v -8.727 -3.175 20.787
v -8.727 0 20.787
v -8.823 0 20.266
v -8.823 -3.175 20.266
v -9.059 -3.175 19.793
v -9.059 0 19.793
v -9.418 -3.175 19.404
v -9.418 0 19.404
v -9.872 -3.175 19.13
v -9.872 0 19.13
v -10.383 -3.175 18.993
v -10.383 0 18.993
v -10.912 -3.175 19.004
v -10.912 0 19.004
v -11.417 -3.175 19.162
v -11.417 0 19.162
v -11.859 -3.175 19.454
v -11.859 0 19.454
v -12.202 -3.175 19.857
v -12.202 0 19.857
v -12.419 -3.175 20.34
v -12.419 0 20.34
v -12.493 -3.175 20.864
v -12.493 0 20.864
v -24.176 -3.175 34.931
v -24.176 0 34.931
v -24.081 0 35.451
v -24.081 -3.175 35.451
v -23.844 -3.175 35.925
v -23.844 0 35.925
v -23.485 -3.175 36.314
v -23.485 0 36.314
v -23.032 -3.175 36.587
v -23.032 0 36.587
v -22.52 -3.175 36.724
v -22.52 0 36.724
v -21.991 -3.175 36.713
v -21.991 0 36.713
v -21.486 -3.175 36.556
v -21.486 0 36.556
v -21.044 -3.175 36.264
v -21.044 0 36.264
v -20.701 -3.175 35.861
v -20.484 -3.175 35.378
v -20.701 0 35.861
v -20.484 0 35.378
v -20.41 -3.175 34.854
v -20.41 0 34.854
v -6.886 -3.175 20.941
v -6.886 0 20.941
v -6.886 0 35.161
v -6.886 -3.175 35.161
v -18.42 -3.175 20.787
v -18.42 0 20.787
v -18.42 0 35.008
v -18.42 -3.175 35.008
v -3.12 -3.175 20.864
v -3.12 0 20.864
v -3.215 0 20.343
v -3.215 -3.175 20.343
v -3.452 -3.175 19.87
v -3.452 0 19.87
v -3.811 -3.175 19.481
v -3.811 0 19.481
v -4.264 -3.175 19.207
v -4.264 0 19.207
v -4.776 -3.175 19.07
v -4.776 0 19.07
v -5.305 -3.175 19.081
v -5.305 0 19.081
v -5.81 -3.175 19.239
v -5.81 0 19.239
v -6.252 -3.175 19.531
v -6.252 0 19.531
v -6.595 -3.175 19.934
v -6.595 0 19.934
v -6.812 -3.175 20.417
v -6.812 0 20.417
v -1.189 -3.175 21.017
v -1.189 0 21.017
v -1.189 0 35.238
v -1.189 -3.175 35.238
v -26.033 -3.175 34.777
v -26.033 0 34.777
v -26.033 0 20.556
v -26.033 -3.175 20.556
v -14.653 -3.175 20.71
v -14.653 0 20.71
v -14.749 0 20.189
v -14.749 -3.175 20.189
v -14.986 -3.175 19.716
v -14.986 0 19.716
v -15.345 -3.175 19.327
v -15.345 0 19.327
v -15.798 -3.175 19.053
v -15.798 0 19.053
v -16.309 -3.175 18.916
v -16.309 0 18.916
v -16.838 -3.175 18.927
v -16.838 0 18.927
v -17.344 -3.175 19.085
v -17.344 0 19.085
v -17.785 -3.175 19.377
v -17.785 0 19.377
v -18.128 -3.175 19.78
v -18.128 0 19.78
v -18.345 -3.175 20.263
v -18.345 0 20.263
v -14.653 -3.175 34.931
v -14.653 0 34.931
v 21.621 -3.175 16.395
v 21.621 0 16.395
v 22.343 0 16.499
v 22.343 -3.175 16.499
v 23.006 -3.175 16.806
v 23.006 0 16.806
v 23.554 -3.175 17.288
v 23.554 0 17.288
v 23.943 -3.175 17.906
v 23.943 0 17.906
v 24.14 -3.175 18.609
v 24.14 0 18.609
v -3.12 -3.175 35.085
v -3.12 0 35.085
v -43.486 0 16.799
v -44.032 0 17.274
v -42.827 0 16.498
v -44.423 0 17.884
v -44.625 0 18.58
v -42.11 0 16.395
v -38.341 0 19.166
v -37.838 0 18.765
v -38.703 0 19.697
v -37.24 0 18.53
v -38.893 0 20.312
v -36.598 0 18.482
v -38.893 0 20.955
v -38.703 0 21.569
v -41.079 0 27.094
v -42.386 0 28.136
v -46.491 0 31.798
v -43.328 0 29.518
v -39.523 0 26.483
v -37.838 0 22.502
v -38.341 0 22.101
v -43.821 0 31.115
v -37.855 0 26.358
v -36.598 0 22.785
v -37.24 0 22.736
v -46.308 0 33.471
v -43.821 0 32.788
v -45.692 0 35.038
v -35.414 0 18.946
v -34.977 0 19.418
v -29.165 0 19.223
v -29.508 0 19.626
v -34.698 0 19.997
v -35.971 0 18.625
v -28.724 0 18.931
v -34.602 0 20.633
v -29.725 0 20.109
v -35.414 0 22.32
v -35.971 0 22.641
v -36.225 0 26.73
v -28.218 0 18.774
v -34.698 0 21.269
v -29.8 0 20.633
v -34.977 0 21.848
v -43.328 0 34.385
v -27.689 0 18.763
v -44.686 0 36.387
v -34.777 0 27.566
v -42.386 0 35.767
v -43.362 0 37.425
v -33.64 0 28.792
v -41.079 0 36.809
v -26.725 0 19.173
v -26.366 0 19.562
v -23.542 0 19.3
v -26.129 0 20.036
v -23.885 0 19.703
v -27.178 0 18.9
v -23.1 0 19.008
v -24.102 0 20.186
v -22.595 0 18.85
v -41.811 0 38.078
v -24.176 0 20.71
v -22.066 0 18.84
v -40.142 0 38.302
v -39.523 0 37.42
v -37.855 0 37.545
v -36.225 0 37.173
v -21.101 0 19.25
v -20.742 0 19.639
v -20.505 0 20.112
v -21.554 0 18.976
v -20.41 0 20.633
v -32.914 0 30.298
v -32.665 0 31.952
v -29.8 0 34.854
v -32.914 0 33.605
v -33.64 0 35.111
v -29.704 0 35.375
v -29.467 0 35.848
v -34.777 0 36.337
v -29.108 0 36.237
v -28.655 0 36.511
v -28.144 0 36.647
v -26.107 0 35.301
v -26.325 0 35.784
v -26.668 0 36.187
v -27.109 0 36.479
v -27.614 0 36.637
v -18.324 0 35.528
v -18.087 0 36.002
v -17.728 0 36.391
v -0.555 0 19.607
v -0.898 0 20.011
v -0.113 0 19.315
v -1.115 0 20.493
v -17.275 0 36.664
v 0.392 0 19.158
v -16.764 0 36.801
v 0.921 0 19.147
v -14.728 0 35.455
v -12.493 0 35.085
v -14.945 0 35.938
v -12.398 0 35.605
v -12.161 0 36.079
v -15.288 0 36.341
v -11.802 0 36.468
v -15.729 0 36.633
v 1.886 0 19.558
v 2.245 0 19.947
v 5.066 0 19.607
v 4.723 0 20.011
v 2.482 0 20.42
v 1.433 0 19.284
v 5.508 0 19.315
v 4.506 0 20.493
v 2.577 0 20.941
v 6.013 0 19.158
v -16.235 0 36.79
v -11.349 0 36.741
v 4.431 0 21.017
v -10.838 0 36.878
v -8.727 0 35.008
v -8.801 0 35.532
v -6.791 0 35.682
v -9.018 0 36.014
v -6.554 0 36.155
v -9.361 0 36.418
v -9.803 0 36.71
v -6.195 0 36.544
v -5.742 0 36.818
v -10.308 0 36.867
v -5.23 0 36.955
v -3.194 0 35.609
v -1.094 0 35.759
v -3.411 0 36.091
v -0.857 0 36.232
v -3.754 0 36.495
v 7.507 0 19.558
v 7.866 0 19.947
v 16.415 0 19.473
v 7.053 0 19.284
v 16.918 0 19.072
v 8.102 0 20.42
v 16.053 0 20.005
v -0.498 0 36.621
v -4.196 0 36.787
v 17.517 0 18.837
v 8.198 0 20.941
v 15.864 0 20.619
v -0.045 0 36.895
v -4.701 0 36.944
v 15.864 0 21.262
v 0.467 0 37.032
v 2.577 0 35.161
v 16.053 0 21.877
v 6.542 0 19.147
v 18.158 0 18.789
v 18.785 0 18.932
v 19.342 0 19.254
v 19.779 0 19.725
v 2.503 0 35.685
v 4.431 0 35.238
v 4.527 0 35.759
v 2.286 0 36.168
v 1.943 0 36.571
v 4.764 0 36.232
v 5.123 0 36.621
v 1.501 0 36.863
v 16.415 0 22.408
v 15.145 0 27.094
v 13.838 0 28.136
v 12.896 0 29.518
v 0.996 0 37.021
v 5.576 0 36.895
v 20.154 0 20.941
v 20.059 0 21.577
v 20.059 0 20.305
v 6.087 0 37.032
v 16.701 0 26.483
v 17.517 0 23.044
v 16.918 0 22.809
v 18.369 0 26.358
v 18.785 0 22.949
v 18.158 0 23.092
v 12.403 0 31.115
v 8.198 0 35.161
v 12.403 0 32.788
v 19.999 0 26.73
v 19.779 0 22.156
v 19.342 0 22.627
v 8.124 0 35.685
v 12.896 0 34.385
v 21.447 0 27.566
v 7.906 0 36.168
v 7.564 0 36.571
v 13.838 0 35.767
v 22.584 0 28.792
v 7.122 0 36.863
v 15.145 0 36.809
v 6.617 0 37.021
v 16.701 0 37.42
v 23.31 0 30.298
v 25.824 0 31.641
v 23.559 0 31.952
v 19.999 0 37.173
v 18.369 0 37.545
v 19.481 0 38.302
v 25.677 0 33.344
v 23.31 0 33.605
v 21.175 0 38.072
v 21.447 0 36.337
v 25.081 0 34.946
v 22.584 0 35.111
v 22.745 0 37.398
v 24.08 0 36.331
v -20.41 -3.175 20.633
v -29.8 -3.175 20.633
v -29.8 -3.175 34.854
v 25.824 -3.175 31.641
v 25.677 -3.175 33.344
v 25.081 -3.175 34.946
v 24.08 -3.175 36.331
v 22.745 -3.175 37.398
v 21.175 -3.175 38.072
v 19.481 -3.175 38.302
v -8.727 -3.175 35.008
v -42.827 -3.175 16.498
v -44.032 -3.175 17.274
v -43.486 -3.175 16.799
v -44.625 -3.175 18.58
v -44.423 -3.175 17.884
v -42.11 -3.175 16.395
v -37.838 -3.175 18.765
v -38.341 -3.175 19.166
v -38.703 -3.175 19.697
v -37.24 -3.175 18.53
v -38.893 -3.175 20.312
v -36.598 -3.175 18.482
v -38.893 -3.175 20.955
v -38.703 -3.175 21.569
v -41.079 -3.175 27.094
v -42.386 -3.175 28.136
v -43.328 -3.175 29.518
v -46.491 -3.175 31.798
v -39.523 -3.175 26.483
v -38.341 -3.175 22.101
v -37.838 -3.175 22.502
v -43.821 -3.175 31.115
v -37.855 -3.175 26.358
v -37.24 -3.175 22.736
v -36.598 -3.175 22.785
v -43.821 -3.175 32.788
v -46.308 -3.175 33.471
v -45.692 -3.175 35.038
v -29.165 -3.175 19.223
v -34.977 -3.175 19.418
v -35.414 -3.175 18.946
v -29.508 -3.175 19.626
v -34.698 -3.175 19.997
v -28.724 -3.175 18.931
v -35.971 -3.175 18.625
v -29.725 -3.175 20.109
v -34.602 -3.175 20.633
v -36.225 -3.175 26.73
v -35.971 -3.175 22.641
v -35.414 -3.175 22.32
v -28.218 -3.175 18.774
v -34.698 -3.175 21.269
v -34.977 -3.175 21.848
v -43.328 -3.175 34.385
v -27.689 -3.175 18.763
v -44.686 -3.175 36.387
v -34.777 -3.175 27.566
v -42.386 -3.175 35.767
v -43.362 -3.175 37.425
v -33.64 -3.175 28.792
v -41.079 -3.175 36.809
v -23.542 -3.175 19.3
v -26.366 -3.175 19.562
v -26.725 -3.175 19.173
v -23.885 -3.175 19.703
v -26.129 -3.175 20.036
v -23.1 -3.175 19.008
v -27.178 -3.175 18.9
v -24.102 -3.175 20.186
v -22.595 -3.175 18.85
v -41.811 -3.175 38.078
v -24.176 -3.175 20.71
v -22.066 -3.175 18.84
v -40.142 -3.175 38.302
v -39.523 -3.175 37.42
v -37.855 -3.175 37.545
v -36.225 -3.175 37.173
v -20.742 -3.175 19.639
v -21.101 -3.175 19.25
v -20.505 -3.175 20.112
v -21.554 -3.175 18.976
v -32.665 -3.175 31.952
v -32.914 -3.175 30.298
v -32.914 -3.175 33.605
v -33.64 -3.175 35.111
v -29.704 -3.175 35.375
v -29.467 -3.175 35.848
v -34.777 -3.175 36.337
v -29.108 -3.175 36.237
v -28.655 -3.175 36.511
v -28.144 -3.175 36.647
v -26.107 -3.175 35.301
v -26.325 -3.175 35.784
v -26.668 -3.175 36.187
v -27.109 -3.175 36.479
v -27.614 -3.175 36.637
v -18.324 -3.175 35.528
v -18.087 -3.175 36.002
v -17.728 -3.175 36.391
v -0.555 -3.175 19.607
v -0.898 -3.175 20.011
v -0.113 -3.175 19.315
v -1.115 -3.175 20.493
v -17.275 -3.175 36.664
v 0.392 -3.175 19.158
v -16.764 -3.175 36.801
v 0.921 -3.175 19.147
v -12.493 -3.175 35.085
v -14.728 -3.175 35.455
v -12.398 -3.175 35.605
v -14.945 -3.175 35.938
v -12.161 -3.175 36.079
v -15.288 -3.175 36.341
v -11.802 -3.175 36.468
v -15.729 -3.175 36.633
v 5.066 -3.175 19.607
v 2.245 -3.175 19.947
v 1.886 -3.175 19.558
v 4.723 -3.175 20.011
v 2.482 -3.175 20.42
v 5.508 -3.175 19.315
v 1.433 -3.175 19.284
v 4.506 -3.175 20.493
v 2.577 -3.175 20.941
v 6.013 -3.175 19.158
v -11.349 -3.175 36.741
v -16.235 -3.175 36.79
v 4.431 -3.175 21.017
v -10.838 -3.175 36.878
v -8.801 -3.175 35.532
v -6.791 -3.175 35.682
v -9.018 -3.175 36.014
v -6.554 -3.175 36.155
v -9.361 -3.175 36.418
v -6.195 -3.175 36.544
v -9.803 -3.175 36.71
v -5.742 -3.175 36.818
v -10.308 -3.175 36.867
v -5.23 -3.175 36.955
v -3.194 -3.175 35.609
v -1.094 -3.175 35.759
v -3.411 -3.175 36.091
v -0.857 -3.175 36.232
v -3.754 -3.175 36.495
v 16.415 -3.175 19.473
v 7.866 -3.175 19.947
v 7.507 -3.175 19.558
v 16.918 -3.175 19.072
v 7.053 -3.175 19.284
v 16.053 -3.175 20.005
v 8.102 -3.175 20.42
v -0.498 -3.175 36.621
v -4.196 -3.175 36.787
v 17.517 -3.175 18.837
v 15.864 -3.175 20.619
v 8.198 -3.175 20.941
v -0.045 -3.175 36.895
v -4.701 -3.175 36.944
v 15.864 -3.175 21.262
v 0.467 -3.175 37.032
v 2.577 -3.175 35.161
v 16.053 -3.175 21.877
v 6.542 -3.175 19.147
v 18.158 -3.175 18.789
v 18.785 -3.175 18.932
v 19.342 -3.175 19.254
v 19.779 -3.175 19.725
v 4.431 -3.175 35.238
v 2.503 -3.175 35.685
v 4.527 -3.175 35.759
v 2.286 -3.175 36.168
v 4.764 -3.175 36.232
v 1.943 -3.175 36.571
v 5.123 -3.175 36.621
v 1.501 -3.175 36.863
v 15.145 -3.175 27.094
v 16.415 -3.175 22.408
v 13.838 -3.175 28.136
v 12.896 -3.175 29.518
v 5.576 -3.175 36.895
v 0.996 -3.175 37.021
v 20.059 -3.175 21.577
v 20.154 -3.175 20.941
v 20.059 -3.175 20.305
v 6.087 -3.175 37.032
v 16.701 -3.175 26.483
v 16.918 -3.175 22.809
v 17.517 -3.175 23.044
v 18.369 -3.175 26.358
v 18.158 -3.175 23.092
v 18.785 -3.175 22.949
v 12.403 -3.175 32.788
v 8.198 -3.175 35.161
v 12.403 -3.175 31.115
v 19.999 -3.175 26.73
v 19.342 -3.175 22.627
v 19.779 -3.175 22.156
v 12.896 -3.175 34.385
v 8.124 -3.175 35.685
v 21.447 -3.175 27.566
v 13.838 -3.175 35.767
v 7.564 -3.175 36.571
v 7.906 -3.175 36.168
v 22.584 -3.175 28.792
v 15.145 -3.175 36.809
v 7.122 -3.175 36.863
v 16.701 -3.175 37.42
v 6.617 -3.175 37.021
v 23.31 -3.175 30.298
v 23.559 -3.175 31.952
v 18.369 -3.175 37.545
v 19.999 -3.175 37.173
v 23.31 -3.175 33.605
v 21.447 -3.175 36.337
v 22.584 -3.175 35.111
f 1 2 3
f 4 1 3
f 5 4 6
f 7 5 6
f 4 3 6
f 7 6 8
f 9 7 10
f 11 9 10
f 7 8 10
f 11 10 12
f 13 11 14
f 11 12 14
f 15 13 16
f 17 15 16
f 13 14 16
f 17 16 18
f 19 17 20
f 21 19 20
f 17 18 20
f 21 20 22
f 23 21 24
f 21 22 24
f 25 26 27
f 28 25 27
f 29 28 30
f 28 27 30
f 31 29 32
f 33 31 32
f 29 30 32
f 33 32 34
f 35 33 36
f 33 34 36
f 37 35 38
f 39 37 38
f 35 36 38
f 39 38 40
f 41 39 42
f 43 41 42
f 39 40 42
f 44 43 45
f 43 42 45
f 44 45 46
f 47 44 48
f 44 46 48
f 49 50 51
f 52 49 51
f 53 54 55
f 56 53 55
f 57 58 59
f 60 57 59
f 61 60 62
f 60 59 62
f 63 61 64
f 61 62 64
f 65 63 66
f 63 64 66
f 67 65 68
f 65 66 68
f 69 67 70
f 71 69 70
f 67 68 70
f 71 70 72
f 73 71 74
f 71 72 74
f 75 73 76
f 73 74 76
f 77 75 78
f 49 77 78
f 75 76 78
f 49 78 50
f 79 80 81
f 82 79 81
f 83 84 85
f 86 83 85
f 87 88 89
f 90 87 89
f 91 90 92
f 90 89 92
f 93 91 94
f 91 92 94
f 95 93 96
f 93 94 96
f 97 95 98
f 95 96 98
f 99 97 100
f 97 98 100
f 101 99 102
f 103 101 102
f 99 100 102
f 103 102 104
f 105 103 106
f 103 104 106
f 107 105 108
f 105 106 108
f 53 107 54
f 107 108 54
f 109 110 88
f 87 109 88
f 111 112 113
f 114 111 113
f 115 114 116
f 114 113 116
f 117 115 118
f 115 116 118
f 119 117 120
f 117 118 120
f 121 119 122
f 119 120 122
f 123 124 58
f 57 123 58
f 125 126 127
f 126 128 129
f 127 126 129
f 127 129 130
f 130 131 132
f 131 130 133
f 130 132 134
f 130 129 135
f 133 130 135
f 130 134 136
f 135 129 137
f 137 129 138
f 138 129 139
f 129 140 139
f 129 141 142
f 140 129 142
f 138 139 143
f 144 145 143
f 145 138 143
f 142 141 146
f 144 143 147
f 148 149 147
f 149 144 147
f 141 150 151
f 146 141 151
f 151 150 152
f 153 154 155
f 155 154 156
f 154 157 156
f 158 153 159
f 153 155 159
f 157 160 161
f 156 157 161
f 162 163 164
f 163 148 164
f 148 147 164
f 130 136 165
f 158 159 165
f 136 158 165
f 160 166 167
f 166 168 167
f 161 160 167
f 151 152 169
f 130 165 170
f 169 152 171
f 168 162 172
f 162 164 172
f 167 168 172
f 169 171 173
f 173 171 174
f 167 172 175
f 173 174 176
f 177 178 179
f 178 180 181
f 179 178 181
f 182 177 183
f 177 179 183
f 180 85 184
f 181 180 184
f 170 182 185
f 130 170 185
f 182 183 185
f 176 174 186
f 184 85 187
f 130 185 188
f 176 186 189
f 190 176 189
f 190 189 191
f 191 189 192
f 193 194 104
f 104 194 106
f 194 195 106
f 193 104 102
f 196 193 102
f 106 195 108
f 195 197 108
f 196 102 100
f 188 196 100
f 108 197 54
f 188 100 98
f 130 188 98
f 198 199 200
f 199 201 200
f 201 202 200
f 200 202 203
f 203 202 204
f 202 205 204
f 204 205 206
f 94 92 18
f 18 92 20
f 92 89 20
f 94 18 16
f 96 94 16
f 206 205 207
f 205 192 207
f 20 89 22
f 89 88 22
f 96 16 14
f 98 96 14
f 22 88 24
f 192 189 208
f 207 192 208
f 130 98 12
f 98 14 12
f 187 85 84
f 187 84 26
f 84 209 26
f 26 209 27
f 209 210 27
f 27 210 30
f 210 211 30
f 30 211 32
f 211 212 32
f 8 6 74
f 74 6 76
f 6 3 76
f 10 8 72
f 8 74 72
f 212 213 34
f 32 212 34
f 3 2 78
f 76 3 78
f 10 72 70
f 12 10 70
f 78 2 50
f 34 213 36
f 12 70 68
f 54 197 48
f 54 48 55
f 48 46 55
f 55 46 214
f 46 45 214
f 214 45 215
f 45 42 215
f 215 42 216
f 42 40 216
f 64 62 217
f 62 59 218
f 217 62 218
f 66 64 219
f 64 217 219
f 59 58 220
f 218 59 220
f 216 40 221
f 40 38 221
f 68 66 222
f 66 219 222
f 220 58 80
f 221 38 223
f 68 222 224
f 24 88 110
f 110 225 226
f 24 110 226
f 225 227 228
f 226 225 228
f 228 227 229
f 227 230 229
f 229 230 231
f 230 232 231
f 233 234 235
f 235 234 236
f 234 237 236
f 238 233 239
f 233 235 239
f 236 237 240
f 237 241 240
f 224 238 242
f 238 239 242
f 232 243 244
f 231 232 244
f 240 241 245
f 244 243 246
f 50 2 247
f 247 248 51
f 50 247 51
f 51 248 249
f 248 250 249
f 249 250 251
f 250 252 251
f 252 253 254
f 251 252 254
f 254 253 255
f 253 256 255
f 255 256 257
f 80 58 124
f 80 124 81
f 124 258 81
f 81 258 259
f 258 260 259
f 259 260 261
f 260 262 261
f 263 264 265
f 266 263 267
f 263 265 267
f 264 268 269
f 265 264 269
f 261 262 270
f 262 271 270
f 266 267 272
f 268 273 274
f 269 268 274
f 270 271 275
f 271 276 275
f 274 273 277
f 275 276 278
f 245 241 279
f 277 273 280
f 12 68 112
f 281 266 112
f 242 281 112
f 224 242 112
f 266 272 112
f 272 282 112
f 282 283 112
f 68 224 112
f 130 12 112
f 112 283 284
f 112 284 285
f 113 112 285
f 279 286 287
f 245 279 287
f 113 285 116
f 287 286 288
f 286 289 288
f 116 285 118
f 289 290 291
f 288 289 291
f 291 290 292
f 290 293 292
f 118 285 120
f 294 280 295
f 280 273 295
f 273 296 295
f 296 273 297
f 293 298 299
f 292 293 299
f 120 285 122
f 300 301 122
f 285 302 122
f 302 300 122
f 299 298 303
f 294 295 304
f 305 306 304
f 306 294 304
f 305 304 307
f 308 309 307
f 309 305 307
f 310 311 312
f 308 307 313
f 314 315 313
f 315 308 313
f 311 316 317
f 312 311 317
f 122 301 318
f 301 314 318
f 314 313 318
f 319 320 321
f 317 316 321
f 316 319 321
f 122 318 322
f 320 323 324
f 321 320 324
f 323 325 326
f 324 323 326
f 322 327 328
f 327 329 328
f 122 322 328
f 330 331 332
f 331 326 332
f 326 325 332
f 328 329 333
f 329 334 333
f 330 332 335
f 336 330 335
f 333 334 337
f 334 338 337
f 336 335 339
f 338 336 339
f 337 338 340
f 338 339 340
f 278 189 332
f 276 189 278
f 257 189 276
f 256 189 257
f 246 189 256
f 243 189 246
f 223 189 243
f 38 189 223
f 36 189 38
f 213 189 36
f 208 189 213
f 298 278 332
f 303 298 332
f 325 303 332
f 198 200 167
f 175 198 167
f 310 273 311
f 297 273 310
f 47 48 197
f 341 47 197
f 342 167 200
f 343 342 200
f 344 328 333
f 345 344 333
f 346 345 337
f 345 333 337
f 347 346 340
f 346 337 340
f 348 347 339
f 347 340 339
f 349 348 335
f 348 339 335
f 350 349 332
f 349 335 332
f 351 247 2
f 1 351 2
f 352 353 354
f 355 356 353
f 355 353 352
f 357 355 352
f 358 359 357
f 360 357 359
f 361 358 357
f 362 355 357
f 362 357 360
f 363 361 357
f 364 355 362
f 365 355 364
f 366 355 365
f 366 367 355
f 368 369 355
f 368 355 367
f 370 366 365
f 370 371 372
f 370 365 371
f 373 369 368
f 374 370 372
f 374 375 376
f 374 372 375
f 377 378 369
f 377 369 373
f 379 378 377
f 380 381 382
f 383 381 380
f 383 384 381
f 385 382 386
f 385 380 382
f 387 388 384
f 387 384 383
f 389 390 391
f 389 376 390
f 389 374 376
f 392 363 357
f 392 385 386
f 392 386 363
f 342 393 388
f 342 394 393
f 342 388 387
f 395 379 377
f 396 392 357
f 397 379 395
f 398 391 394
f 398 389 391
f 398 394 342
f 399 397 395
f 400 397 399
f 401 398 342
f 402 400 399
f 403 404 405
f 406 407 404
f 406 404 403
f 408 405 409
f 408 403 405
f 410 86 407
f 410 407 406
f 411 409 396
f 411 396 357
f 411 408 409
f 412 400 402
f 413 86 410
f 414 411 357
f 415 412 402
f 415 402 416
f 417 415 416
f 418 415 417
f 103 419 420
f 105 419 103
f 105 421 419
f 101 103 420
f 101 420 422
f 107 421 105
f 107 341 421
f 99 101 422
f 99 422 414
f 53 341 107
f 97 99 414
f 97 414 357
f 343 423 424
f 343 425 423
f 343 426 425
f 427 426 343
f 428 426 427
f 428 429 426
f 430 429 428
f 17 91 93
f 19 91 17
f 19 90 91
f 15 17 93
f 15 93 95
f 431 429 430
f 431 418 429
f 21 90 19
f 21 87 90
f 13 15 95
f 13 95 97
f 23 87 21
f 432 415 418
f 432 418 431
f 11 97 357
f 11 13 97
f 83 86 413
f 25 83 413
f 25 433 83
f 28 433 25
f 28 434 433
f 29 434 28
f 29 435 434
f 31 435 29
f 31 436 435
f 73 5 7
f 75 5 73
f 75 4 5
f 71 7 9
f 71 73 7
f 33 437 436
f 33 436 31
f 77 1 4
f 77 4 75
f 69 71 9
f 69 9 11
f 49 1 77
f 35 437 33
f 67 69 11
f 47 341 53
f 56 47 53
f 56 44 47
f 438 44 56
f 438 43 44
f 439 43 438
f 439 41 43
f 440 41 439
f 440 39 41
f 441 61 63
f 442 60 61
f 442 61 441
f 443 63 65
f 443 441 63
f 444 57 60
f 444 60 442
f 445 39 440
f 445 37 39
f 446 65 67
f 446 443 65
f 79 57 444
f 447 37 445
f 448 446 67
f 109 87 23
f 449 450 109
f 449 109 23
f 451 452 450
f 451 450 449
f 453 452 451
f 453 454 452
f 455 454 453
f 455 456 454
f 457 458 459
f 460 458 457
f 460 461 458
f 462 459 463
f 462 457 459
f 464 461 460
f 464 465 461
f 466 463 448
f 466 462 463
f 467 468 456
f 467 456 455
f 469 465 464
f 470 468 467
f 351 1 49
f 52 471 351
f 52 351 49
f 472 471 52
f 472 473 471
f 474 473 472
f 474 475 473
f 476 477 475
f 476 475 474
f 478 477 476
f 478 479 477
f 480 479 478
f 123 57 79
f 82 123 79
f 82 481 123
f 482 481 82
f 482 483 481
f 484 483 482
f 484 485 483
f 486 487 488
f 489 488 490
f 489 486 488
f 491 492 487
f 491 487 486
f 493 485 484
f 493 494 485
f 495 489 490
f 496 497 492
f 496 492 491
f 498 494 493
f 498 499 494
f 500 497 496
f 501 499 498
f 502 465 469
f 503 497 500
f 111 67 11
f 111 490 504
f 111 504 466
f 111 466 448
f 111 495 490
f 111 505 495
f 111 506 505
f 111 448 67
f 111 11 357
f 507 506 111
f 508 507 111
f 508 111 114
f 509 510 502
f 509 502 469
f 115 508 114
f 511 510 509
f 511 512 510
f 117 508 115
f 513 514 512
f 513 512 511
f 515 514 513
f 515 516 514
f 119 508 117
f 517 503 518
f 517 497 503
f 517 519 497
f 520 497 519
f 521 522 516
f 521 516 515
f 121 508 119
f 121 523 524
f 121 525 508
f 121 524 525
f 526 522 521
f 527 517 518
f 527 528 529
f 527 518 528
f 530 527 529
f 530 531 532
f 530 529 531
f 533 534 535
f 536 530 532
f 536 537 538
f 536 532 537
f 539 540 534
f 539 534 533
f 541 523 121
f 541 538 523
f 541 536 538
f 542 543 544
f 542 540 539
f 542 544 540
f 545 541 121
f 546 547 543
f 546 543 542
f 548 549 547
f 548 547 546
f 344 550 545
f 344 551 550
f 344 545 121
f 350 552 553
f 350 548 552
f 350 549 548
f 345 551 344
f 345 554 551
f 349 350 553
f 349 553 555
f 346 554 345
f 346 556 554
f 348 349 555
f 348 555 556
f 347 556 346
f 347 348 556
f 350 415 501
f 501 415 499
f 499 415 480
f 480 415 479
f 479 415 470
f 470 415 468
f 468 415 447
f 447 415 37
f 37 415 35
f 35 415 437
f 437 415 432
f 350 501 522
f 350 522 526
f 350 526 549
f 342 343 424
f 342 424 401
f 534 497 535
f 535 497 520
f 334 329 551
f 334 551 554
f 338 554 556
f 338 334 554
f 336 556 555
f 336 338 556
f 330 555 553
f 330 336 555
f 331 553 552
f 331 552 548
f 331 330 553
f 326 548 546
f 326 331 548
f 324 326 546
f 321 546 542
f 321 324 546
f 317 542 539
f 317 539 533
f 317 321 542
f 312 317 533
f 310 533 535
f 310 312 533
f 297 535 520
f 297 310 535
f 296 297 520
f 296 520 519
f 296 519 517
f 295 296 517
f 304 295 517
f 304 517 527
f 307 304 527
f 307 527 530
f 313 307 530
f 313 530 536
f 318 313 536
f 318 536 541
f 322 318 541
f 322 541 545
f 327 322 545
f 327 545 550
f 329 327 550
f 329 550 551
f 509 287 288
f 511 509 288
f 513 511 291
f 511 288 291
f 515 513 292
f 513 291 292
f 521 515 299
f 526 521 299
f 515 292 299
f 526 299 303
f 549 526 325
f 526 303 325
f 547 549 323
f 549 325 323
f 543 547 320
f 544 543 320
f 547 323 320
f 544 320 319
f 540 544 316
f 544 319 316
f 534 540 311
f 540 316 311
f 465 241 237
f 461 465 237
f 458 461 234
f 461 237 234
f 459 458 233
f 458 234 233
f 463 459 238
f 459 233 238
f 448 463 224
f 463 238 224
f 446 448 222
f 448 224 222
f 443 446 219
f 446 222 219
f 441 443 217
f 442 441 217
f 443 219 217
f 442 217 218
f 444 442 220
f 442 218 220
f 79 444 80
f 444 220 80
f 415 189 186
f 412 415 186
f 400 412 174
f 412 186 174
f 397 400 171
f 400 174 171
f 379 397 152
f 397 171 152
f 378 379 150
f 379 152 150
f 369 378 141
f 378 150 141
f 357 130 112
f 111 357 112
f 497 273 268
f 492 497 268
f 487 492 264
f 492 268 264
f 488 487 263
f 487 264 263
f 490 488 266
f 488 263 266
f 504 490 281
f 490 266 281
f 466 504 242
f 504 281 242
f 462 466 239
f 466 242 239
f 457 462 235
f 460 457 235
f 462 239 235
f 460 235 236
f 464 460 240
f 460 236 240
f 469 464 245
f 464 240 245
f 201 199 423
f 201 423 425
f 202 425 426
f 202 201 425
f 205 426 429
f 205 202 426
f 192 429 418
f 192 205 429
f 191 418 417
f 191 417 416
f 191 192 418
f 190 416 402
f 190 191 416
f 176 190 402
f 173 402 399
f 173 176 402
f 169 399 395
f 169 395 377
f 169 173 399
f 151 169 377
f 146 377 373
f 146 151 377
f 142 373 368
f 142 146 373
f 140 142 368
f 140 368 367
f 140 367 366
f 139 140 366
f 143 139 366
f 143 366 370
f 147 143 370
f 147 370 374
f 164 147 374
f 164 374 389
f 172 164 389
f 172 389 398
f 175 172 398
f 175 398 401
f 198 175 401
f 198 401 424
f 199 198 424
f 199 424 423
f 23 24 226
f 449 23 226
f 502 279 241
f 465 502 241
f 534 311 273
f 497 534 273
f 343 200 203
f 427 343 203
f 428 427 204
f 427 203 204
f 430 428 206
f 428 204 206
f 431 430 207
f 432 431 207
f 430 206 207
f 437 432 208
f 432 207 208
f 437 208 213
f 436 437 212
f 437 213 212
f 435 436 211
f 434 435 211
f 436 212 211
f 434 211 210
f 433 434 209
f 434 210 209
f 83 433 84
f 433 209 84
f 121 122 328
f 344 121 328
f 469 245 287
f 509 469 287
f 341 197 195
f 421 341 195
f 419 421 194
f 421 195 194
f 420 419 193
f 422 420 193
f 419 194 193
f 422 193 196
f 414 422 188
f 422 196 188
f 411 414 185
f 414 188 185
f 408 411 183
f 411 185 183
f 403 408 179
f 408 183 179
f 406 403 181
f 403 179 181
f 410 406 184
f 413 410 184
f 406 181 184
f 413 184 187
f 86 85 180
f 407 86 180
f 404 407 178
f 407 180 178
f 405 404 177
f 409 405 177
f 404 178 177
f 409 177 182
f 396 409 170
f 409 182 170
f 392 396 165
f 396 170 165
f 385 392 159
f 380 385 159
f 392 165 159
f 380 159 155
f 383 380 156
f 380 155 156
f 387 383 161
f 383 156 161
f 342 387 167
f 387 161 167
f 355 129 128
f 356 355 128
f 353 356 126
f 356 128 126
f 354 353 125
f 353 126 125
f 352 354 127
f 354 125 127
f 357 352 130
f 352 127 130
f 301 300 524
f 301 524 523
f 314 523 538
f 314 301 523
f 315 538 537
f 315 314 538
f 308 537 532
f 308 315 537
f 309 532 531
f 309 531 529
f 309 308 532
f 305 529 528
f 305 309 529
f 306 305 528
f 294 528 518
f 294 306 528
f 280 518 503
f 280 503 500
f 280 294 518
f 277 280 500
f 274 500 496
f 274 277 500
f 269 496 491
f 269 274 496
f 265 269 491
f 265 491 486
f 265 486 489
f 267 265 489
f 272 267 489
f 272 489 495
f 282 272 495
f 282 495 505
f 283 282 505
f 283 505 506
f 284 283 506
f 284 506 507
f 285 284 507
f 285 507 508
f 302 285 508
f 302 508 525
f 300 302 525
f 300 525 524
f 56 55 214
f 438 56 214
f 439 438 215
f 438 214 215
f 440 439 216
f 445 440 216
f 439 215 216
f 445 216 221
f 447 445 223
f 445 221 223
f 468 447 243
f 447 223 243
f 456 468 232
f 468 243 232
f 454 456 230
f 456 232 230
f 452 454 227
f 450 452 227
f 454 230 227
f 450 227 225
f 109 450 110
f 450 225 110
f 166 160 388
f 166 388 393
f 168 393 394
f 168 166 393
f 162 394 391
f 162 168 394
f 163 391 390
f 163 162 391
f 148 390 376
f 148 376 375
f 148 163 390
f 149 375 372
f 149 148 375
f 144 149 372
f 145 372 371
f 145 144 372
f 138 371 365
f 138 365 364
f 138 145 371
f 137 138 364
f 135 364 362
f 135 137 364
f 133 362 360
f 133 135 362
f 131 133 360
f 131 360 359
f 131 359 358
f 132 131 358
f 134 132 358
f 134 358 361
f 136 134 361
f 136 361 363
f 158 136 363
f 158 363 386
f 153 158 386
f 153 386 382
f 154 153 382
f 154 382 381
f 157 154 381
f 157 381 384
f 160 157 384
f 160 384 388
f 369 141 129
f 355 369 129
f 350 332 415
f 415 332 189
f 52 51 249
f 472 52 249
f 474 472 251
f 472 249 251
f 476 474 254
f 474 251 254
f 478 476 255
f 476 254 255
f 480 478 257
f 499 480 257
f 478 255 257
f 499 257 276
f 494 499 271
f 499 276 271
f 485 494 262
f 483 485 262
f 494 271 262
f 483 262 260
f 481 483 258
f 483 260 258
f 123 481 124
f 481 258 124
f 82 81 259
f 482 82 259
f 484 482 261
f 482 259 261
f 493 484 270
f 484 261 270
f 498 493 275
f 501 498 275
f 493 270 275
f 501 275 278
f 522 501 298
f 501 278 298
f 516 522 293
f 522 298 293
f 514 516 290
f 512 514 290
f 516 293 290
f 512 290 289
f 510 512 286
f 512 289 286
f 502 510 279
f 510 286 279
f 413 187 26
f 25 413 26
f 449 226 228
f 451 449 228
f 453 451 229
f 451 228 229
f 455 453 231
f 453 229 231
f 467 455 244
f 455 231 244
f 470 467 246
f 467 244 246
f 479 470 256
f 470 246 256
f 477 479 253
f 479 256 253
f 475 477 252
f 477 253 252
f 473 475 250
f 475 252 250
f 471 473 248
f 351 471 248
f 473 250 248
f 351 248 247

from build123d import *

# Parameters (mm, degrees)
F0_R     = 2.157429
F0_R_2   = 5.60947
F1_DEPTH = 3.175
F2_DEPTH = 0.004921
F3_DEPTH = 3.175


with BuildPart() as f1:
    # F0 (on Front) → F1 (new body)
    with BuildSketch(Plane.XZ):
        with BuildLine():
            Line((19.481216, 38.301506), (-40.142396, 38.301506))
            ThreePointArc((-40.142396, 38.301506), (-44.686392, 36.387111), (-46.490546, 31.798229))
            Line((-46.490546, 31.798229), (-44.625234, 18.579618))
            ThreePointArc((-44.625234, 18.579618), (-43.776004, 17.017098), (-42.110151, 16.394528))
            Line((-42.110151, 16.394528), (21.620648, 16.394528))
            ThreePointArc((21.620648, 16.394528), (23.297675, 17.026865), (24.139706, 18.609033))
            Line((24.139706, 18.609033), (25.823629, 31.641185))
            ThreePointArc((25.823629, 31.641185), (24.07975, 36.330545), (19.481216, 38.301506))
        make_face()
        with Locations((-36.75957, 20.633117)):
            Circle(F0_R, mode=Mode.SUBTRACT)
        with Locations((17.996946, 20.940602)):
            Circle(F0_R, mode=Mode.SUBTRACT)
        with Locations((-38.274463, 31.951506)):
            Circle(F0_R_2, mode=Mode.SUBTRACT)
        with BuildLine():
            Line((-29.799683, 20.633117), (-29.799683, 34.853889))
            ThreePointArc((-29.799683, 34.853889), (-27.878732, 36.660702), (-26.0331, 34.777018))
            Line((-26.0331, 34.777018), (-26.0331, 20.556246))
            ThreePointArc((-26.0331, 20.556246), (-27.954051, 18.749433), (-29.799683, 20.633117))
        make_face(mode=Mode.SUBTRACT)
        with BuildLine():
            Line((-24.176236, 20.709988), (-24.176236, 34.93076))
            ThreePointArc((-24.176236, 34.93076), (-22.255285, 36.737572), (-20.409653, 34.853889))
            Line((-20.409653, 34.853889), (-20.409653, 20.633116))
            ThreePointArc((-20.409653, 20.633116), (-22.330604, 18.826304), (-24.176236, 20.709988))
        make_face(mode=Mode.SUBTRACT)
        with BuildLine():
            Line((-18.419787, 20.786859), (-18.419787, 35.007631))
            ThreePointArc((-18.419787, 35.007631), (-16.498836, 36.814444), (-14.653204, 34.93076))
            Line((-14.653204, 34.93076), (-14.653204, 20.709988))
            ThreePointArc((-14.653204, 20.709988), (-16.574155, 18.903175), (-18.419787, 20.786859))
        make_face(mode=Mode.SUBTRACT)
        with BuildLine():
            Line((-12.493486, 20.86373), (-12.493486, 35.084503))
            ThreePointArc((-12.493486, 35.084503), (-10.572535, 36.891315), (-8.726902, 35.007631))
            Line((-8.726902, 35.007631), (-8.726902, 20.786859))
            ThreePointArc((-8.726902, 20.786859), (-10.647853, 18.980047), (-12.493486, 20.86373))
        make_face(mode=Mode.SUBTRACT)
        with BuildLine():
            Line((-6.886294, 20.940602), (-6.886294, 35.161374))
            ThreePointArc((-6.886294, 35.161374), (-4.965343, 36.968187), (-3.11971, 35.084503))
            Line((-3.11971, 35.084503), (-3.11971, 20.86373))
            ThreePointArc((-3.11971, 20.86373), (-5.040661, 19.056918), (-6.886294, 20.940602))
        make_face(mode=Mode.SUBTRACT)
        with BuildLine():
            Line((-1.18931, 21.017473), (-1.18931, 35.238246))
            ThreePointArc((-1.18931, 35.238246), (0.73164, 37.045058), (2.577273, 35.161374))
            Line((2.577273, 35.161374), (2.577273, 20.940602))
            ThreePointArc((2.577273, 20.940602), (0.656322, 19.133789), (-1.18931, 21.017473))
        make_face(mode=Mode.SUBTRACT)
        with BuildLine():
            Line((4.431474, 21.017473), (4.431474, 35.238246))
            ThreePointArc((4.431474, 35.238246), (6.352424, 37.045058), (8.198057, 35.161374))
            Line((8.198057, 35.161374), (8.198057, 20.940602))
            ThreePointArc((8.198057, 20.940602), (6.277106, 19.133789), (4.431474, 21.017473))
        make_face(mode=Mode.SUBTRACT)
        with Locations((17.949626, 31.951506)):
            Circle(F0_R_2, mode=Mode.SUBTRACT)
    extrude(amount=F1_DEPTH)

    # F0 (on Front) → F2 (join)
    with BuildSketch(Plane.XZ):
        with BuildLine():
            Line((19.481216, 38.301506), (-40.142396, 38.301506))
            ThreePointArc((-40.142396, 38.301506), (-44.686392, 36.387111), (-46.490546, 31.798229))
            Line((-46.490546, 31.798229), (-44.625234, 18.579618))
            ThreePointArc((-44.625234, 18.579618), (-43.776004, 17.017098), (-42.110151, 16.394528))
            Line((-42.110151, 16.394528), (21.620648, 16.394528))
            ThreePointArc((21.620648, 16.394528), (23.297675, 17.026865), (24.139706, 18.609033))
            Line((24.139706, 18.609033), (25.823629, 31.641185))
            ThreePointArc((25.823629, 31.641185), (24.07975, 36.330545), (19.481216, 38.301506))
        make_face()
        with Locations((-36.75957, 20.633117)):
            Circle(F0_R, mode=Mode.SUBTRACT)
        with Locations((17.996946, 20.940602)):
            Circle(F0_R, mode=Mode.SUBTRACT)
        with Locations((-38.274463, 31.951506)):
            Circle(F0_R_2, mode=Mode.SUBTRACT)
        with BuildLine():
            Line((-29.799683, 20.633117), (-29.799683, 34.853889))
            ThreePointArc((-29.799683, 34.853889), (-27.878732, 36.660702), (-26.0331, 34.777018))
            Line((-26.0331, 34.777018), (-26.0331, 20.556246))
            ThreePointArc((-26.0331, 20.556246), (-27.954051, 18.749433), (-29.799683, 20.633117))
        make_face(mode=Mode.SUBTRACT)
        with BuildLine():
            Line((-24.176236, 20.709988), (-24.176236, 34.93076))
            ThreePointArc((-24.176236, 34.93076), (-22.255285, 36.737572), (-20.409653, 34.853889))
            Line((-20.409653, 34.853889), (-20.409653, 20.633116))
            ThreePointArc((-20.409653, 20.633116), (-22.330604, 18.826304), (-24.176236, 20.709988))
        make_face(mode=Mode.SUBTRACT)
        with BuildLine():
            Line((-18.419787, 20.786859), (-18.419787, 35.007631))
            ThreePointArc((-18.419787, 35.007631), (-16.498836, 36.814444), (-14.653204, 34.93076))
            Line((-14.653204, 34.93076), (-14.653204, 20.709988))
            ThreePointArc((-14.653204, 20.709988), (-16.574155, 18.903175), (-18.419787, 20.786859))
        make_face(mode=Mode.SUBTRACT)
        with BuildLine():
            Line((-12.493486, 20.86373), (-12.493486, 35.084503))
            ThreePointArc((-12.493486, 35.084503), (-10.572535, 36.891315), (-8.726902, 35.007631))
            Line((-8.726902, 35.007631), (-8.726902, 20.786859))
            ThreePointArc((-8.726902, 20.786859), (-10.647853, 18.980047), (-12.493486, 20.86373))
        make_face(mode=Mode.SUBTRACT)
        with BuildLine():
            Line((-6.886294, 20.940602), (-6.886294, 35.161374))
            ThreePointArc((-6.886294, 35.161374), (-4.965343, 36.968187), (-3.11971, 35.084503))
            Line((-3.11971, 35.084503), (-3.11971, 20.86373))
            ThreePointArc((-3.11971, 20.86373), (-5.040661, 19.056918), (-6.886294, 20.940602))
        make_face(mode=Mode.SUBTRACT)
        with BuildLine():
            Line((-1.18931, 21.017473), (-1.18931, 35.238246))
            ThreePointArc((-1.18931, 35.238246), (0.73164, 37.045058), (2.577273, 35.161374))
            Line((2.577273, 35.161374), (2.577273, 20.940602))
            ThreePointArc((2.577273, 20.940602), (0.656322, 19.133789), (-1.18931, 21.017473))
        make_face(mode=Mode.SUBTRACT)
        with BuildLine():
            Line((4.431474, 21.017473), (4.431474, 35.238246))
            ThreePointArc((4.431474, 35.238246), (6.352424, 37.045058), (8.198057, 35.161374))
            Line((8.198057, 35.161374), (8.198057, 20.940602))
            ThreePointArc((8.198057, 20.940602), (6.277106, 19.133789), (4.431474, 21.017473))
        make_face(mode=Mode.SUBTRACT)
        with Locations((17.949626, 31.951506)):
            Circle(F0_R_2, mode=Mode.SUBTRACT)
    extrude(amount=F2_DEPTH)

    # F0 (on Front) → F3 (join)
    with BuildSketch(Plane.XZ):
        with BuildLine():
            Line((19.481216, 38.301506), (-40.142396, 38.301506))
            ThreePointArc((-40.142396, 38.301506), (-44.686392, 36.387111), (-46.490546, 31.798229))
            Line((-46.490546, 31.798229), (-44.625234, 18.579618))
            ThreePointArc((-44.625234, 18.579618), (-43.776004, 17.017098), (-42.110151, 16.394528))
            Line((-42.110151, 16.394528), (21.620648, 16.394528))
            ThreePointArc((21.620648, 16.394528), (23.297675, 17.026865), (24.139706, 18.609033))
            Line((24.139706, 18.609033), (25.823629, 31.641185))
            ThreePointArc((25.823629, 31.641185), (24.07975, 36.330545), (19.481216, 38.301506))
        make_face()
        with Locations((-36.75957, 20.633117)):
            Circle(F0_R, mode=Mode.SUBTRACT)
        with Locations((17.996946, 20.940602)):
            Circle(F0_R, mode=Mode.SUBTRACT)
        with Locations((-38.274463, 31.951506)):
            Circle(F0_R_2, mode=Mode.SUBTRACT)
        with BuildLine():
            Line((-29.799683, 20.633117), (-29.799683, 34.853889))
            ThreePointArc((-29.799683, 34.853889), (-27.878732, 36.660702), (-26.0331, 34.777018))
            Line((-26.0331, 34.777018), (-26.0331, 20.556246))
            ThreePointArc((-26.0331, 20.556246), (-27.954051, 18.749433), (-29.799683, 20.633117))
        make_face(mode=Mode.SUBTRACT)
        with BuildLine():
            Line((-24.176236, 20.709988), (-24.176236, 34.93076))
            ThreePointArc((-24.176236, 34.93076), (-22.255285, 36.737572), (-20.409653, 34.853889))
            Line((-20.409653, 34.853889), (-20.409653, 20.633116))
            ThreePointArc((-20.409653, 20.633116), (-22.330604, 18.826304), (-24.176236, 20.709988))
        make_face(mode=Mode.SUBTRACT)
        with BuildLine():
            Line((-18.419787, 20.786859), (-18.419787, 35.007631))
            ThreePointArc((-18.419787, 35.007631), (-16.498836, 36.814444), (-14.653204, 34.93076))
            Line((-14.653204, 34.93076), (-14.653204, 20.709988))
            ThreePointArc((-14.653204, 20.709988), (-16.574155, 18.903175), (-18.419787, 20.786859))
        make_face(mode=Mode.SUBTRACT)
        with BuildLine():
            Line((-12.493486, 20.86373), (-12.493486, 35.084503))
            ThreePointArc((-12.493486, 35.084503), (-10.572535, 36.891315), (-8.726902, 35.007631))
            Line((-8.726902, 35.007631), (-8.726902, 20.786859))
            ThreePointArc((-8.726902, 20.786859), (-10.647853, 18.980047), (-12.493486, 20.86373))
        make_face(mode=Mode.SUBTRACT)
        with BuildLine():
            Line((-6.886294, 20.940602), (-6.886294, 35.161374))
            ThreePointArc((-6.886294, 35.161374), (-4.965343, 36.968187), (-3.11971, 35.084503))
            Line((-3.11971, 35.084503), (-3.11971, 20.86373))
            ThreePointArc((-3.11971, 20.86373), (-5.040661, 19.056918), (-6.886294, 20.940602))
        make_face(mode=Mode.SUBTRACT)
        with BuildLine():
            Line((-1.18931, 21.017473), (-1.18931, 35.238246))
            ThreePointArc((-1.18931, 35.238246), (0.73164, 37.045058), (2.577273, 35.161374))
            Line((2.577273, 35.161374), (2.577273, 20.940602))
            ThreePointArc((2.577273, 20.940602), (0.656322, 19.133789), (-1.18931, 21.017473))
        make_face(mode=Mode.SUBTRACT)
        with BuildLine():
            Line((4.431474, 21.017473), (4.431474, 35.238246))
            ThreePointArc((4.431474, 35.238246), (6.352424, 37.045058), (8.198057, 35.161374))
            Line((8.198057, 35.161374), (8.198057, 20.940602))
            ThreePointArc((8.198057, 20.940602), (6.277106, 19.133789), (4.431474, 21.017473))
        make_face(mode=Mode.SUBTRACT)
        with Locations((17.949626, 31.951506)):
            Circle(F0_R_2, mode=Mode.SUBTRACT)
    extrude(amount=F3_DEPTH)


solid = f1.part
